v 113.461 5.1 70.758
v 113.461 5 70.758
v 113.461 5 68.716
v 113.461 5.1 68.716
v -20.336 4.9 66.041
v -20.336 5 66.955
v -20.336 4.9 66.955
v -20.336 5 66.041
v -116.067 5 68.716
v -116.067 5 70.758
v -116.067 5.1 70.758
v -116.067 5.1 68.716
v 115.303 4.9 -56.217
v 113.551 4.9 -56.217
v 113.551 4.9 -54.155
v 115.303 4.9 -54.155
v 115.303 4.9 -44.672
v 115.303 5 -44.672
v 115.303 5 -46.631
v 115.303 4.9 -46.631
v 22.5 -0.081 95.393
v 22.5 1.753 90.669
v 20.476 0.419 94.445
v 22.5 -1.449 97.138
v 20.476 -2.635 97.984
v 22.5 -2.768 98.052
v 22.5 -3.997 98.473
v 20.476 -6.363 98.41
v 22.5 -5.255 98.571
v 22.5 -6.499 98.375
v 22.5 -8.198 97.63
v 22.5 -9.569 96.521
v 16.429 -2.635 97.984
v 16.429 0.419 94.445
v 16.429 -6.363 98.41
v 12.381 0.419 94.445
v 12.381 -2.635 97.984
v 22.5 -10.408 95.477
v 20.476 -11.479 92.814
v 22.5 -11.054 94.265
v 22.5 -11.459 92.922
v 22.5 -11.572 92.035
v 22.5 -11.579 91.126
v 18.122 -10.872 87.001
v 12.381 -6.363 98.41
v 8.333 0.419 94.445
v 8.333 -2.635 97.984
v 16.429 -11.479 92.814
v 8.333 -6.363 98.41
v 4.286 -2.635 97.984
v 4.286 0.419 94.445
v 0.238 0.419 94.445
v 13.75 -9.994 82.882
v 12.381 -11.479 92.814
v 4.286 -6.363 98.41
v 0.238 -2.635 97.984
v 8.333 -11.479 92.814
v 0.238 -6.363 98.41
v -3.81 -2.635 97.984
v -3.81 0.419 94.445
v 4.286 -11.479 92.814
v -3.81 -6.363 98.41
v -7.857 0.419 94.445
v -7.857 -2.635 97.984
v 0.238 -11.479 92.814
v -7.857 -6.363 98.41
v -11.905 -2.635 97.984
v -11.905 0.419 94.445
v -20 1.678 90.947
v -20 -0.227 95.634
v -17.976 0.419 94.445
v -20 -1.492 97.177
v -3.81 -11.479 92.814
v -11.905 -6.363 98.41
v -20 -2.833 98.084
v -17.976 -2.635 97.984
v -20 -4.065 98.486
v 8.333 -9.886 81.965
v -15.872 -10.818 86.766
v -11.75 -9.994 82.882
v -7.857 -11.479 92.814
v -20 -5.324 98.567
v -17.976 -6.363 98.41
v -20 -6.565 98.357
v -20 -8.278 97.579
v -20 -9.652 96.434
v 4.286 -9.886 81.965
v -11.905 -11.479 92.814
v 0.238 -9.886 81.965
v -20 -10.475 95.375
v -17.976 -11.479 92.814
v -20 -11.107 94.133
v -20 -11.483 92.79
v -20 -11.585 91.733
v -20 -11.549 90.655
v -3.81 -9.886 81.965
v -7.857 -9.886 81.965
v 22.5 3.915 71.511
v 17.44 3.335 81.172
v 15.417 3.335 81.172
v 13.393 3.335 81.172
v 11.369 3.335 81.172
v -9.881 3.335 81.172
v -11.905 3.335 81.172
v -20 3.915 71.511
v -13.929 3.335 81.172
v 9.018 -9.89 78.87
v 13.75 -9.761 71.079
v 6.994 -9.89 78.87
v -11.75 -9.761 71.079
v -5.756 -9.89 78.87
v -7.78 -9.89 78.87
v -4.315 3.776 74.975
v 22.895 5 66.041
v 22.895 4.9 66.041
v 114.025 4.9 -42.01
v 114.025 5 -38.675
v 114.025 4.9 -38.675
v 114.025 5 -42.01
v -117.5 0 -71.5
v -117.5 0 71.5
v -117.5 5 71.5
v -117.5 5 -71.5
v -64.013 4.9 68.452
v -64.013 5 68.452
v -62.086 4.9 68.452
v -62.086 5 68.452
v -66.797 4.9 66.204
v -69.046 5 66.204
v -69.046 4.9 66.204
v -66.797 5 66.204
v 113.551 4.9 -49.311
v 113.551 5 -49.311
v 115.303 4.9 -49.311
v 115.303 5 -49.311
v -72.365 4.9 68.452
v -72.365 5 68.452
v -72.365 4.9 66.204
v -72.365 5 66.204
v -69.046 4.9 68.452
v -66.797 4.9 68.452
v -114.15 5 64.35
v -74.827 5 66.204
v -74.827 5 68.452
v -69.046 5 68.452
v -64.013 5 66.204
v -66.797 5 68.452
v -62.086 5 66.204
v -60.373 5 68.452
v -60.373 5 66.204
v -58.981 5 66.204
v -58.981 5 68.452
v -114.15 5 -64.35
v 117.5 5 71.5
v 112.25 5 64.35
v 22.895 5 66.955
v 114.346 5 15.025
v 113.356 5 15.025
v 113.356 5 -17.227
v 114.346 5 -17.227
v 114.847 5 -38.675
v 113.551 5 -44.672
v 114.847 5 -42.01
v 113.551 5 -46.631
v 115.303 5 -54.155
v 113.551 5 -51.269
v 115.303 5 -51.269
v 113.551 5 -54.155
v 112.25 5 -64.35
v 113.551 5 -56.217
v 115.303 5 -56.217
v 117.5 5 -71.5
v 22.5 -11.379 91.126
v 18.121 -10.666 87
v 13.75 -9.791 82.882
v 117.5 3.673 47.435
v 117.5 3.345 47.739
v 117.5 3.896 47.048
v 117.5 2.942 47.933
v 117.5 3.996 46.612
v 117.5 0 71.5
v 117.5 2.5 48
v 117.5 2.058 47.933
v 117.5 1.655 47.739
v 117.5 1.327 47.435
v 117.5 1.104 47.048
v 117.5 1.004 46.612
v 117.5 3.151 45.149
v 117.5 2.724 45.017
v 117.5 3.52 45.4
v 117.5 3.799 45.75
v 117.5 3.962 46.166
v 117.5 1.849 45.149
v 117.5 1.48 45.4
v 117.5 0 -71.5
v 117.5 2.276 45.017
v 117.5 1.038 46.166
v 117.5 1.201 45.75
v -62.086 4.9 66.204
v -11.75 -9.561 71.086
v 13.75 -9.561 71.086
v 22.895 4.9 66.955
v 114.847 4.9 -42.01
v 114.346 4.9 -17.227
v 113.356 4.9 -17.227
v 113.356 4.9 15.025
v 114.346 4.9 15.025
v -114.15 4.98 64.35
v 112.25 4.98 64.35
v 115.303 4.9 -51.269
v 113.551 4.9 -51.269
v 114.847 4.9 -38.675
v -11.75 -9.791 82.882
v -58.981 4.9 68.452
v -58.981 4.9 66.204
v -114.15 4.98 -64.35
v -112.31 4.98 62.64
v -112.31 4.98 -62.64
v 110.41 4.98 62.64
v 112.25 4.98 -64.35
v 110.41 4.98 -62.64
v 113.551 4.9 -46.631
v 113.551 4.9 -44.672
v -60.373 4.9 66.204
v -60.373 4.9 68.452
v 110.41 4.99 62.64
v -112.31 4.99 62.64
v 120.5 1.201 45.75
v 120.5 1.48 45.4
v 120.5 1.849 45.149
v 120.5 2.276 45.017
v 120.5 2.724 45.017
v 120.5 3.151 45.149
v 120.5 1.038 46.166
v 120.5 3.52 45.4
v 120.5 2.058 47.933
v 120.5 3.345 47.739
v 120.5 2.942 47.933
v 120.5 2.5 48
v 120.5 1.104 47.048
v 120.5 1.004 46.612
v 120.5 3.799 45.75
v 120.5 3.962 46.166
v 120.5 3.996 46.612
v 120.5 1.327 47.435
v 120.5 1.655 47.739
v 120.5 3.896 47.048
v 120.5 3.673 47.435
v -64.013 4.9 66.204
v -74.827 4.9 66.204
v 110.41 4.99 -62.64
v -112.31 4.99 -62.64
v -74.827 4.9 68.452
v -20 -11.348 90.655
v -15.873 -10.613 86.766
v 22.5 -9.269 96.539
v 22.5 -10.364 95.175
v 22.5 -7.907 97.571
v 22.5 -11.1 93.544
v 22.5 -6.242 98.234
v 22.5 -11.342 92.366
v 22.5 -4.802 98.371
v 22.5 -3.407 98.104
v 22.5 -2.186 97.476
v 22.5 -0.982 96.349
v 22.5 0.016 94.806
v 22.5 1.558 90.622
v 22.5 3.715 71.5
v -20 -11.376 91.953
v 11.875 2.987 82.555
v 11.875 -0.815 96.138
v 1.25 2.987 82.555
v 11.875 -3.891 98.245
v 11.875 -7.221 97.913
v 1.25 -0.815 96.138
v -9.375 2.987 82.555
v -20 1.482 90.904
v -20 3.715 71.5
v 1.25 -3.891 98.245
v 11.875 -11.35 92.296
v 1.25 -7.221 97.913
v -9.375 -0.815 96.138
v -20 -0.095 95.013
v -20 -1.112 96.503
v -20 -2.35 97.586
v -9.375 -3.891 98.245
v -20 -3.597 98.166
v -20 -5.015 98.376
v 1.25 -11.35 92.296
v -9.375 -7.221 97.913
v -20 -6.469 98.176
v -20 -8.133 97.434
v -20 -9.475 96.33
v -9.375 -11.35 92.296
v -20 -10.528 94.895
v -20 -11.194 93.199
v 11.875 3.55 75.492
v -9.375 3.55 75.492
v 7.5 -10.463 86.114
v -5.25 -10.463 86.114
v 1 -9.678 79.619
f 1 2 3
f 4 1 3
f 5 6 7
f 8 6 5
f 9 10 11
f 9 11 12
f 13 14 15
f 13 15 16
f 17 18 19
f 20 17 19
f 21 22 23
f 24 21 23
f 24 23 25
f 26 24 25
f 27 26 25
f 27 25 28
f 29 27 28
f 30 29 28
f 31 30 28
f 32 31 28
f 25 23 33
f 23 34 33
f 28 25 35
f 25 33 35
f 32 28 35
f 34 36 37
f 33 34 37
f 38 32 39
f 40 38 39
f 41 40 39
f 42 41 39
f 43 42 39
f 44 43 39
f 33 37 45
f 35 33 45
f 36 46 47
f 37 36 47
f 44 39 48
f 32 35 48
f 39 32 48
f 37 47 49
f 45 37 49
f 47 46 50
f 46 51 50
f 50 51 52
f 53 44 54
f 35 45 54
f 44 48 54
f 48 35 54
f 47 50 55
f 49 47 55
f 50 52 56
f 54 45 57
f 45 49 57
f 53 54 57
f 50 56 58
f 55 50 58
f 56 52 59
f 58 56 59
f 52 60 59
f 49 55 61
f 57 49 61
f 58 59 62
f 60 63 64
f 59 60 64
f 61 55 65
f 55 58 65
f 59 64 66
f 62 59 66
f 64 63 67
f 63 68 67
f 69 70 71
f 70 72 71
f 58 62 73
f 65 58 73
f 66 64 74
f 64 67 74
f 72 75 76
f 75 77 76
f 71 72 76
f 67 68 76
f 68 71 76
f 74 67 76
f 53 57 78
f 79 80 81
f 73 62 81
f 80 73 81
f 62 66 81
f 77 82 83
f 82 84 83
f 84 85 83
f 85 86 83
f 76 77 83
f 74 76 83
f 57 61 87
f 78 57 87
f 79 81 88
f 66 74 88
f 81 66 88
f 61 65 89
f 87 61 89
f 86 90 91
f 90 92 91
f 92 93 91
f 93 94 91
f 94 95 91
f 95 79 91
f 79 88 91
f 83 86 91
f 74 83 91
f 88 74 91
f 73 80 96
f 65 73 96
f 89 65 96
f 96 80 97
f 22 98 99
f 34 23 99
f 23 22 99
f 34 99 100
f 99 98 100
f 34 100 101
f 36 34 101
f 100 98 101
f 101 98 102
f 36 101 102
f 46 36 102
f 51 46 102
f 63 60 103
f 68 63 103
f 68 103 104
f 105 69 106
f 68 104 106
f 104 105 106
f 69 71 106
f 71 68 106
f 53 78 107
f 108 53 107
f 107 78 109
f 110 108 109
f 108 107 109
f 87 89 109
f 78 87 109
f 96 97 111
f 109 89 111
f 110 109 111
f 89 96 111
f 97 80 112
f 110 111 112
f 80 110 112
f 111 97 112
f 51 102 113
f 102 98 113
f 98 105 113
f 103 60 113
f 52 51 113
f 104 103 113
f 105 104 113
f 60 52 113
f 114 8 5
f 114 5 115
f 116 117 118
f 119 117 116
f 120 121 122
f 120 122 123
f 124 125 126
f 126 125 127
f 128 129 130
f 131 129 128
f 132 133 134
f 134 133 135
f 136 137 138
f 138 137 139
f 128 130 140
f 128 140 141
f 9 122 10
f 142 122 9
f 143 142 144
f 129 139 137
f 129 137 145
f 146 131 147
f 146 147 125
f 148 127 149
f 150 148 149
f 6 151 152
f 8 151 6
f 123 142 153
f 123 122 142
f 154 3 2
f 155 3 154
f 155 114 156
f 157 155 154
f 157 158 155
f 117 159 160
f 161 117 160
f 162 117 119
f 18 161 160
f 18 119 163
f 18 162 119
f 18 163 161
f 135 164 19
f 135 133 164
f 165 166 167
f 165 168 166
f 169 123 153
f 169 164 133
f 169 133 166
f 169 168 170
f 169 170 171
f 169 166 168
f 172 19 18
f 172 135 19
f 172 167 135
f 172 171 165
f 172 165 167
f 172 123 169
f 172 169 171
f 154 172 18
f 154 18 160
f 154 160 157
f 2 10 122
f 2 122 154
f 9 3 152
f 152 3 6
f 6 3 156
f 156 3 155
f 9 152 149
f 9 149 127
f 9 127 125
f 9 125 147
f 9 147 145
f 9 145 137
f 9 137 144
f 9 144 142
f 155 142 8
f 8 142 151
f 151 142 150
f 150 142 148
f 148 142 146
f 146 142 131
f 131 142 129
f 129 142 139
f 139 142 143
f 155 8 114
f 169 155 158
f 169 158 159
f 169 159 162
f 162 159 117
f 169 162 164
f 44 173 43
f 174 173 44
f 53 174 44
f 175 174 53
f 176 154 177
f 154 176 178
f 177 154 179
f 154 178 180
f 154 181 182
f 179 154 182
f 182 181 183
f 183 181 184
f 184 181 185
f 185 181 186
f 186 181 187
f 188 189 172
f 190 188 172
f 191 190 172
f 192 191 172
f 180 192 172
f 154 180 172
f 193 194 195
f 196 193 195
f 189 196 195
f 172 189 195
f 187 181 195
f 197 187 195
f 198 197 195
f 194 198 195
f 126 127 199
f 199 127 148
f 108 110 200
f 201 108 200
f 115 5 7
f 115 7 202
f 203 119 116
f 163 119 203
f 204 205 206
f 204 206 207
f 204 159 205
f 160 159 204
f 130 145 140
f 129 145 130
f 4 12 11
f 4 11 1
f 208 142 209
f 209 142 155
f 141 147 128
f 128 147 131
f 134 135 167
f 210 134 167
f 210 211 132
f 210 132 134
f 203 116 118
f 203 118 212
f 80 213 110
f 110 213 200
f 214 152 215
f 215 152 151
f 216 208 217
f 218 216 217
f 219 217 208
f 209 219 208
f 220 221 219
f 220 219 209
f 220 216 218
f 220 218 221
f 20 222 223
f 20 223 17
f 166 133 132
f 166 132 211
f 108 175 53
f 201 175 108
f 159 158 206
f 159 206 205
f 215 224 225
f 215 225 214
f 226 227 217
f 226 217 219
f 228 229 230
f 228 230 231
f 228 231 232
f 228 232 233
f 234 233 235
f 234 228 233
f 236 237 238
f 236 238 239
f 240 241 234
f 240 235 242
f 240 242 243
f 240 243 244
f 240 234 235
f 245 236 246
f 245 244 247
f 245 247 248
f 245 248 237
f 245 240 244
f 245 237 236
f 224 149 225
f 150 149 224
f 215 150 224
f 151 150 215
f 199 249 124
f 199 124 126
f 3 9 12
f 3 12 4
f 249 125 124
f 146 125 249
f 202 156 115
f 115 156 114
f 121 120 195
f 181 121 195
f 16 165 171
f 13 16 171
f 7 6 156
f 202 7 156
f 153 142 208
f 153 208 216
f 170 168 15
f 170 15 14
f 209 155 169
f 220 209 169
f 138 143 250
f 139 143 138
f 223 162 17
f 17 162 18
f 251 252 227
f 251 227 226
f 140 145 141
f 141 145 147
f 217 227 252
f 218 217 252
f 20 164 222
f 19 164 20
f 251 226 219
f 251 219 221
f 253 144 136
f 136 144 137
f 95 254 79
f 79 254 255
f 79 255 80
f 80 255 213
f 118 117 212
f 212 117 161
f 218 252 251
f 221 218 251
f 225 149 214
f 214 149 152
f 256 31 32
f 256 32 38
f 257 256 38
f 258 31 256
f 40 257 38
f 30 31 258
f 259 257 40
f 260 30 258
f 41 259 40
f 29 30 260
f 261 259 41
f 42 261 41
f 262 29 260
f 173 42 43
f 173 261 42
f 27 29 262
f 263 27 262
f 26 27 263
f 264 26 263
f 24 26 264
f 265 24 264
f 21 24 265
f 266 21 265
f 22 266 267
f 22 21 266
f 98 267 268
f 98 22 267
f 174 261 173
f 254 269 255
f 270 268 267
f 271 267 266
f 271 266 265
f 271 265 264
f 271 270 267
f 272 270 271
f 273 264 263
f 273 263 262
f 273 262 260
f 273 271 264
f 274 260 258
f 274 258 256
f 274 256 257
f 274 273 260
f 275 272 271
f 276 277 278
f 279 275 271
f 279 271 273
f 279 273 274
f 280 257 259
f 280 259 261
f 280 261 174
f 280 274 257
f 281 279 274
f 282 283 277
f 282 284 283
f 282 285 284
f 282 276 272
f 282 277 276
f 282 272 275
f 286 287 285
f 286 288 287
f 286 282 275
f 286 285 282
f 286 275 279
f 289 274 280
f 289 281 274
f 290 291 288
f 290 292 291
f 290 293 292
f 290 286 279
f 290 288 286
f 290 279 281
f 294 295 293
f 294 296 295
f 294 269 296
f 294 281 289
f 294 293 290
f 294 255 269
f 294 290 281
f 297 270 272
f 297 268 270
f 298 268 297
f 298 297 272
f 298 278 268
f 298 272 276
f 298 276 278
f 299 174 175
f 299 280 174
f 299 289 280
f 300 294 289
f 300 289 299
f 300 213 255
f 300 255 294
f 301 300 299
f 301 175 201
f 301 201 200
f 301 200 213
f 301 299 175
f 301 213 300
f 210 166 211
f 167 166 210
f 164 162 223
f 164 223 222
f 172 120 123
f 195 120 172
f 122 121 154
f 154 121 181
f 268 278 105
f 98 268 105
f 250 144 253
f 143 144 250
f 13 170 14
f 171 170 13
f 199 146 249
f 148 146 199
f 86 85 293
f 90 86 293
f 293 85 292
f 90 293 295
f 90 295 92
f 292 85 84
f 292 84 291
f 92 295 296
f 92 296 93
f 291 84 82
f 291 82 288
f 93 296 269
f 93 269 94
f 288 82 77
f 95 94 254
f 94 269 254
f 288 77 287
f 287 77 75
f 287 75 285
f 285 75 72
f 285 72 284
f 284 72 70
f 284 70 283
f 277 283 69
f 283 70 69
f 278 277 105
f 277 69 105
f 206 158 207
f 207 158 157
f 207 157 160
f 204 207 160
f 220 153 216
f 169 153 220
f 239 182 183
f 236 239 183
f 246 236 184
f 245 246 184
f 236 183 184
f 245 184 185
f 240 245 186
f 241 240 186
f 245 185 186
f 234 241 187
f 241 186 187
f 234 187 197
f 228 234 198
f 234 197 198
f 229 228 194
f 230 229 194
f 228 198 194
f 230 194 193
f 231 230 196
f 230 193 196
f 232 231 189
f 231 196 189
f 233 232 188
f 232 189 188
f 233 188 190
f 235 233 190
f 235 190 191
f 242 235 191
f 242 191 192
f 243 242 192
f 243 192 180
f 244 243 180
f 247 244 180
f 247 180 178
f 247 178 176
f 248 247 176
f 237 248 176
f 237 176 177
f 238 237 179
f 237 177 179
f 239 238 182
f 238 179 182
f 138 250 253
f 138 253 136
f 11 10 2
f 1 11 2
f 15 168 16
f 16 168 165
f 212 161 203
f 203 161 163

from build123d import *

# Parameters (mm, degrees)
SKETCH_1_W             = 235
SKETCH_1_H             = 143
EXTRUDE_1_DEPTH        = 5
SKETCH_2_W             = 226.4
SKETCH_2_H             = 128.7
SKETCH_2_W_2           = 222.72
SKETCH_2_H_2           = 125.28
CUT_EXTRUDE_946_DEPTH  = 0.02
SKETCH_3_W             = 222.72
SKETCH_3_H             = 125.28
CUT_EXTRUDE_2_DEPTH    = 0.01
SKETCH_9_W             = 43.231071258
SKETCH_9_H             = 0.914041318
SKETCH_9_W_2           = 0.989446634
SKETCH_9_H_2           = 32.252128775
IC_DEPTH               = 0.1
SKETCH_10_W            = 229.528734104
SKETCH_10_H            = 2.042373104
EXTRUDE_1609_DEPTH     = 0.1
SKETCH_12_W            = 1.752275411
SKETCH_12_H            = 1.95842546
SKETCH_12_H_2          = 2.061500484
SKETCH_12_W_2          = 0.821661147
SKETCH_12_H_3          = 3.334977598
SKETCH_12_W_3          = 1.391919846
SKETCH_12_H_4          = 2.248485905
SKETCH_12_W_4          = 1.927273633
SKETCH_12_W_5          = 2.248485905
SKETCH_12_W_6          = 2.46262742
CUT_EXTRUDE_1968_DEPTH = 0.1
SKETCH_6_R             = 1.5
EXTRUDE_2975_DEPTH     = 3
EXTRUDE_START          = -20
EXTRUDE_3073_DEPTH     = 42.5
CUT_EXTRUDE_10_DEPTH   = 20


# Read off the part's stored shape, not the designer's step: 显示器出线
with BuildPart() as part:
    # 草图1 → 凸台-拉伸1 (new body)
    with BuildSketch(Plane(origin=(0, 0, 0), x_dir=(1, 0, 0), z_dir=(0, 1, 0))):
        Rectangle(SKETCH_1_W, SKETCH_1_H)
    extrude(amount=EXTRUDE_1_DEPTH)

    # 草图2 → Cut-Extrude 946 (cut)
    with BuildSketch(Plane(origin=(0, 5, 0), x_dir=(1, 0, 0), z_dir=(0, 1, 0))):
        with Locations((-0.95, 0)):
            Rectangle(SKETCH_2_W, SKETCH_2_H)
        with Locations((-0.95, 0)):
            Rectangle(SKETCH_2_W_2, SKETCH_2_H_2, mode=Mode.SUBTRACT)
    extrude(amount=-CUT_EXTRUDE_946_DEPTH, mode=Mode.SUBTRACT)

    # 草图3 → 切除-拉伸2 (cut)
    with BuildSketch(Plane(origin=(0, 5, 0), x_dir=(1, 0, 0), z_dir=(0, 1, 0))):
        with Locations((-0.95, 0)):
            Rectangle(SKETCH_3_W, SKETCH_3_H)
    extrude(amount=-CUT_EXTRUDE_2_DEPTH, mode=Mode.SUBTRACT)

    # 草图9 → 驱动IC (cut)
    with BuildSketch(Plane(origin=(0, 5, 0), x_dir=(1, 0, 0), z_dir=(0, 1, 0))):
        with Locations((1.279638732, -66.49846616)):
            Rectangle(SKETCH_9_W, SKETCH_9_H)
        with Locations((113.850935725, 1.100856888)):
            Rectangle(SKETCH_9_W_2, SKETCH_9_H_2)
    extrude(amount=-IC_DEPTH, mode=Mode.SUBTRACT)

    # 草图10 → Extrude 1609 (add)
    with BuildSketch(Plane(origin=(0, 5, 0), x_dir=(1, 0, 0), z_dir=(0, 1, 0))):
        with Locations((-1.302960394, -69.73680436)):
            Rectangle(SKETCH_10_W, SKETCH_10_H)
    extrude(amount=EXTRUDE_1609_DEPTH)

    # 草图12 → Cut-Extrude 1968 (cut)
    with BuildSketch(Plane(origin=(0, 5, 0), x_dir=(1, 0, 0), z_dir=(0, 1, 0))):
        with Locations((114.427090568, 45.651616033)):
            Rectangle(SKETCH_12_W, SKETCH_12_H)
        with Locations((114.427090568, 50.289992121)):
            Rectangle(SKETCH_12_W, SKETCH_12_H)
        with Locations((114.427090568, 55.18605577)):
            Rectangle(SKETCH_12_W, SKETCH_12_H_2)
        with Locations((114.436218982, 40.342954237)):
            Rectangle(SKETCH_12_W_2, SKETCH_12_H_3)
        with Locations((-59.67691262, -67.327753911)):
            Rectangle(SKETCH_12_W_3, SKETCH_12_H_4)
        with Locations((-63.049641478, -67.327753911)):
            Rectangle(SKETCH_12_W_4, SKETCH_12_H_4)
        with Locations((-67.921360937, -67.327753911)):
            Rectangle(SKETCH_12_W_5, SKETCH_12_H_4)
        with Locations((-73.596111078, -67.327753911)):
            Rectangle(SKETCH_12_W_6, SKETCH_12_H_4)
    extrude(amount=-CUT_EXTRUDE_1968_DEPTH, mode=Mode.SUBTRACT)

    # 草图6 → Extrude 2975 (add)
    with BuildSketch(Plane(origin=(117.5, 0, 0), x_dir=(0, 0, -1), z_dir=(1, 0, 0))):
        with Locations(Location((-46.5, 2.5, 0), (0, 0, 180))):
            Circle(SKETCH_6_R)
    extrude(amount=EXTRUDE_2975_DEPTH)


with BuildPart() as body_2:
    # Extrude 3073 outline → Extrude 3073 (new body)
    with BuildSketch(Plane(origin=(0, 0, 0), x_dir=(0, 0, -1), z_dir=(1, 0, 0)).offset(EXTRUDE_START)):
        with BuildLine():
            Line((-71.5, 3.715080853), (-71.510941867, 3.914781317))
            add(Edge.make_bspline(
                [(-71.510941867, 3.914781317), (-71.754872478, 3.901416018), (-72.194627935, 3.886763321), (-73.375759203, 3.844189538), (-74.118468696, 3.816160416), (-76.687488083, 3.694423661), (-78.854740178, 3.563082228), (-83.488334604, 3.106680779), (-85.954589269, 2.781725794), (-90.579689225, 1.843151605), (-92.738088621, 1.230687146), (-95.298568099, 0.013827058), (-96.03901686, -0.44346832), (-97.221733342, -1.472185096), (-97.669095243, -2.039061022), (-98.614896037, -3.827959887), (-98.713721913, -5.134815257), (-98.106970737, -7.591942772), (-97.404747884, -8.745092281), (-95.457384583, -10.564446673), (-94.210454059, -11.23132569), (-92.465397642, -11.541011542), (-92.106307033, -11.575415238), (-91.381240644, -11.594111693), (-91.015133288, -11.579658489), (-89.921936504, -11.48615957), (-89.199790652, -11.357035963), (-88.19172911, -11.144940279), (-87.868265248, -11.071147612), (-87.257934145, -10.930863762), (-86.971110762, -10.864833729), (-86.159796466, -10.678644701), (-85.684921812, -10.570266672), (-84.42053346, -10.286760291), (-83.791272064, -10.153303985), (-82.759616666, -9.967236766), (-82.357844012, -9.914586008), (-81.571899715, -9.857819276), (-81.186286297, -9.853698372), (-80.22152636, -9.864877736), (-79.643229224, -9.880196341), (-77.322866146, -9.909696774), (-74.996130434, -9.907296329), (-71.07852286, -9.761341876)],
                knots=[0, 0, 0, 0, 0.03125, 0.03125, 0.0625, 0.0625, 0.125, 0.125, 0.1875, 0.1875, 0.25, 0.25, 0.28125, 0.28125, 0.3125, 0.3125, 0.375, 0.375, 0.4375, 0.4375, 0.5, 0.5, 0.515625, 0.515625, 0.53125, 0.53125, 0.5625, 0.5625, 0.578125, 0.578125, 0.59375, 0.59375, 0.625, 0.625, 0.6875, 0.6875, 0.75, 0.75, 0.8125, 0.8125, 0.875, 0.875, 1, 1, 1, 1], degree=3))
            Line((-71.07852286, -9.761341876), (-71.085968898, -9.561480532))
            add(Edge.make_bspline(
                [(-71.5, 3.715080853), (-73.69113346, 3.595025589), (-104.84149021, 3.243041633), (-96.396950011, -12.830379964), (-78.578293713, -8.725552261), (-84.244341591, -10.051709086), (-71.085968898, -9.561480532)],
                knots=[0, 0, 0, 0, 0.275007382, 0.507346711, 0.579845973, 1, 1, 1, 1], degree=3))
        make_face()
    extrude(amount=EXTRUDE_3073_DEPTH)

    # 草图8 → 切除-拉伸10 (cut)
    with BuildSketch(Plane.XZ):
        Polygon((-11.75, -0.135871582), (-41.070949031, -0.135871582), (-41.070949031, 95.755276899), (-22.423816173, 95.755276899), (-22.423816173, 92.938340681), (-11.75, 82.88168411), align=None)
        Polygon((43.070949031, 95.755276899), (24.423816173, 95.755276899), (24.423816173, 92.938340681), (13.75, 82.88168411), (13.75, -0.135871582), (43.070949031, -0.135871582), align=None)
    extrude(amount=CUT_EXTRUDE_10_DEPTH, mode=Mode.SUBTRACT)


solid = Compound([part.part, body_2.part])
